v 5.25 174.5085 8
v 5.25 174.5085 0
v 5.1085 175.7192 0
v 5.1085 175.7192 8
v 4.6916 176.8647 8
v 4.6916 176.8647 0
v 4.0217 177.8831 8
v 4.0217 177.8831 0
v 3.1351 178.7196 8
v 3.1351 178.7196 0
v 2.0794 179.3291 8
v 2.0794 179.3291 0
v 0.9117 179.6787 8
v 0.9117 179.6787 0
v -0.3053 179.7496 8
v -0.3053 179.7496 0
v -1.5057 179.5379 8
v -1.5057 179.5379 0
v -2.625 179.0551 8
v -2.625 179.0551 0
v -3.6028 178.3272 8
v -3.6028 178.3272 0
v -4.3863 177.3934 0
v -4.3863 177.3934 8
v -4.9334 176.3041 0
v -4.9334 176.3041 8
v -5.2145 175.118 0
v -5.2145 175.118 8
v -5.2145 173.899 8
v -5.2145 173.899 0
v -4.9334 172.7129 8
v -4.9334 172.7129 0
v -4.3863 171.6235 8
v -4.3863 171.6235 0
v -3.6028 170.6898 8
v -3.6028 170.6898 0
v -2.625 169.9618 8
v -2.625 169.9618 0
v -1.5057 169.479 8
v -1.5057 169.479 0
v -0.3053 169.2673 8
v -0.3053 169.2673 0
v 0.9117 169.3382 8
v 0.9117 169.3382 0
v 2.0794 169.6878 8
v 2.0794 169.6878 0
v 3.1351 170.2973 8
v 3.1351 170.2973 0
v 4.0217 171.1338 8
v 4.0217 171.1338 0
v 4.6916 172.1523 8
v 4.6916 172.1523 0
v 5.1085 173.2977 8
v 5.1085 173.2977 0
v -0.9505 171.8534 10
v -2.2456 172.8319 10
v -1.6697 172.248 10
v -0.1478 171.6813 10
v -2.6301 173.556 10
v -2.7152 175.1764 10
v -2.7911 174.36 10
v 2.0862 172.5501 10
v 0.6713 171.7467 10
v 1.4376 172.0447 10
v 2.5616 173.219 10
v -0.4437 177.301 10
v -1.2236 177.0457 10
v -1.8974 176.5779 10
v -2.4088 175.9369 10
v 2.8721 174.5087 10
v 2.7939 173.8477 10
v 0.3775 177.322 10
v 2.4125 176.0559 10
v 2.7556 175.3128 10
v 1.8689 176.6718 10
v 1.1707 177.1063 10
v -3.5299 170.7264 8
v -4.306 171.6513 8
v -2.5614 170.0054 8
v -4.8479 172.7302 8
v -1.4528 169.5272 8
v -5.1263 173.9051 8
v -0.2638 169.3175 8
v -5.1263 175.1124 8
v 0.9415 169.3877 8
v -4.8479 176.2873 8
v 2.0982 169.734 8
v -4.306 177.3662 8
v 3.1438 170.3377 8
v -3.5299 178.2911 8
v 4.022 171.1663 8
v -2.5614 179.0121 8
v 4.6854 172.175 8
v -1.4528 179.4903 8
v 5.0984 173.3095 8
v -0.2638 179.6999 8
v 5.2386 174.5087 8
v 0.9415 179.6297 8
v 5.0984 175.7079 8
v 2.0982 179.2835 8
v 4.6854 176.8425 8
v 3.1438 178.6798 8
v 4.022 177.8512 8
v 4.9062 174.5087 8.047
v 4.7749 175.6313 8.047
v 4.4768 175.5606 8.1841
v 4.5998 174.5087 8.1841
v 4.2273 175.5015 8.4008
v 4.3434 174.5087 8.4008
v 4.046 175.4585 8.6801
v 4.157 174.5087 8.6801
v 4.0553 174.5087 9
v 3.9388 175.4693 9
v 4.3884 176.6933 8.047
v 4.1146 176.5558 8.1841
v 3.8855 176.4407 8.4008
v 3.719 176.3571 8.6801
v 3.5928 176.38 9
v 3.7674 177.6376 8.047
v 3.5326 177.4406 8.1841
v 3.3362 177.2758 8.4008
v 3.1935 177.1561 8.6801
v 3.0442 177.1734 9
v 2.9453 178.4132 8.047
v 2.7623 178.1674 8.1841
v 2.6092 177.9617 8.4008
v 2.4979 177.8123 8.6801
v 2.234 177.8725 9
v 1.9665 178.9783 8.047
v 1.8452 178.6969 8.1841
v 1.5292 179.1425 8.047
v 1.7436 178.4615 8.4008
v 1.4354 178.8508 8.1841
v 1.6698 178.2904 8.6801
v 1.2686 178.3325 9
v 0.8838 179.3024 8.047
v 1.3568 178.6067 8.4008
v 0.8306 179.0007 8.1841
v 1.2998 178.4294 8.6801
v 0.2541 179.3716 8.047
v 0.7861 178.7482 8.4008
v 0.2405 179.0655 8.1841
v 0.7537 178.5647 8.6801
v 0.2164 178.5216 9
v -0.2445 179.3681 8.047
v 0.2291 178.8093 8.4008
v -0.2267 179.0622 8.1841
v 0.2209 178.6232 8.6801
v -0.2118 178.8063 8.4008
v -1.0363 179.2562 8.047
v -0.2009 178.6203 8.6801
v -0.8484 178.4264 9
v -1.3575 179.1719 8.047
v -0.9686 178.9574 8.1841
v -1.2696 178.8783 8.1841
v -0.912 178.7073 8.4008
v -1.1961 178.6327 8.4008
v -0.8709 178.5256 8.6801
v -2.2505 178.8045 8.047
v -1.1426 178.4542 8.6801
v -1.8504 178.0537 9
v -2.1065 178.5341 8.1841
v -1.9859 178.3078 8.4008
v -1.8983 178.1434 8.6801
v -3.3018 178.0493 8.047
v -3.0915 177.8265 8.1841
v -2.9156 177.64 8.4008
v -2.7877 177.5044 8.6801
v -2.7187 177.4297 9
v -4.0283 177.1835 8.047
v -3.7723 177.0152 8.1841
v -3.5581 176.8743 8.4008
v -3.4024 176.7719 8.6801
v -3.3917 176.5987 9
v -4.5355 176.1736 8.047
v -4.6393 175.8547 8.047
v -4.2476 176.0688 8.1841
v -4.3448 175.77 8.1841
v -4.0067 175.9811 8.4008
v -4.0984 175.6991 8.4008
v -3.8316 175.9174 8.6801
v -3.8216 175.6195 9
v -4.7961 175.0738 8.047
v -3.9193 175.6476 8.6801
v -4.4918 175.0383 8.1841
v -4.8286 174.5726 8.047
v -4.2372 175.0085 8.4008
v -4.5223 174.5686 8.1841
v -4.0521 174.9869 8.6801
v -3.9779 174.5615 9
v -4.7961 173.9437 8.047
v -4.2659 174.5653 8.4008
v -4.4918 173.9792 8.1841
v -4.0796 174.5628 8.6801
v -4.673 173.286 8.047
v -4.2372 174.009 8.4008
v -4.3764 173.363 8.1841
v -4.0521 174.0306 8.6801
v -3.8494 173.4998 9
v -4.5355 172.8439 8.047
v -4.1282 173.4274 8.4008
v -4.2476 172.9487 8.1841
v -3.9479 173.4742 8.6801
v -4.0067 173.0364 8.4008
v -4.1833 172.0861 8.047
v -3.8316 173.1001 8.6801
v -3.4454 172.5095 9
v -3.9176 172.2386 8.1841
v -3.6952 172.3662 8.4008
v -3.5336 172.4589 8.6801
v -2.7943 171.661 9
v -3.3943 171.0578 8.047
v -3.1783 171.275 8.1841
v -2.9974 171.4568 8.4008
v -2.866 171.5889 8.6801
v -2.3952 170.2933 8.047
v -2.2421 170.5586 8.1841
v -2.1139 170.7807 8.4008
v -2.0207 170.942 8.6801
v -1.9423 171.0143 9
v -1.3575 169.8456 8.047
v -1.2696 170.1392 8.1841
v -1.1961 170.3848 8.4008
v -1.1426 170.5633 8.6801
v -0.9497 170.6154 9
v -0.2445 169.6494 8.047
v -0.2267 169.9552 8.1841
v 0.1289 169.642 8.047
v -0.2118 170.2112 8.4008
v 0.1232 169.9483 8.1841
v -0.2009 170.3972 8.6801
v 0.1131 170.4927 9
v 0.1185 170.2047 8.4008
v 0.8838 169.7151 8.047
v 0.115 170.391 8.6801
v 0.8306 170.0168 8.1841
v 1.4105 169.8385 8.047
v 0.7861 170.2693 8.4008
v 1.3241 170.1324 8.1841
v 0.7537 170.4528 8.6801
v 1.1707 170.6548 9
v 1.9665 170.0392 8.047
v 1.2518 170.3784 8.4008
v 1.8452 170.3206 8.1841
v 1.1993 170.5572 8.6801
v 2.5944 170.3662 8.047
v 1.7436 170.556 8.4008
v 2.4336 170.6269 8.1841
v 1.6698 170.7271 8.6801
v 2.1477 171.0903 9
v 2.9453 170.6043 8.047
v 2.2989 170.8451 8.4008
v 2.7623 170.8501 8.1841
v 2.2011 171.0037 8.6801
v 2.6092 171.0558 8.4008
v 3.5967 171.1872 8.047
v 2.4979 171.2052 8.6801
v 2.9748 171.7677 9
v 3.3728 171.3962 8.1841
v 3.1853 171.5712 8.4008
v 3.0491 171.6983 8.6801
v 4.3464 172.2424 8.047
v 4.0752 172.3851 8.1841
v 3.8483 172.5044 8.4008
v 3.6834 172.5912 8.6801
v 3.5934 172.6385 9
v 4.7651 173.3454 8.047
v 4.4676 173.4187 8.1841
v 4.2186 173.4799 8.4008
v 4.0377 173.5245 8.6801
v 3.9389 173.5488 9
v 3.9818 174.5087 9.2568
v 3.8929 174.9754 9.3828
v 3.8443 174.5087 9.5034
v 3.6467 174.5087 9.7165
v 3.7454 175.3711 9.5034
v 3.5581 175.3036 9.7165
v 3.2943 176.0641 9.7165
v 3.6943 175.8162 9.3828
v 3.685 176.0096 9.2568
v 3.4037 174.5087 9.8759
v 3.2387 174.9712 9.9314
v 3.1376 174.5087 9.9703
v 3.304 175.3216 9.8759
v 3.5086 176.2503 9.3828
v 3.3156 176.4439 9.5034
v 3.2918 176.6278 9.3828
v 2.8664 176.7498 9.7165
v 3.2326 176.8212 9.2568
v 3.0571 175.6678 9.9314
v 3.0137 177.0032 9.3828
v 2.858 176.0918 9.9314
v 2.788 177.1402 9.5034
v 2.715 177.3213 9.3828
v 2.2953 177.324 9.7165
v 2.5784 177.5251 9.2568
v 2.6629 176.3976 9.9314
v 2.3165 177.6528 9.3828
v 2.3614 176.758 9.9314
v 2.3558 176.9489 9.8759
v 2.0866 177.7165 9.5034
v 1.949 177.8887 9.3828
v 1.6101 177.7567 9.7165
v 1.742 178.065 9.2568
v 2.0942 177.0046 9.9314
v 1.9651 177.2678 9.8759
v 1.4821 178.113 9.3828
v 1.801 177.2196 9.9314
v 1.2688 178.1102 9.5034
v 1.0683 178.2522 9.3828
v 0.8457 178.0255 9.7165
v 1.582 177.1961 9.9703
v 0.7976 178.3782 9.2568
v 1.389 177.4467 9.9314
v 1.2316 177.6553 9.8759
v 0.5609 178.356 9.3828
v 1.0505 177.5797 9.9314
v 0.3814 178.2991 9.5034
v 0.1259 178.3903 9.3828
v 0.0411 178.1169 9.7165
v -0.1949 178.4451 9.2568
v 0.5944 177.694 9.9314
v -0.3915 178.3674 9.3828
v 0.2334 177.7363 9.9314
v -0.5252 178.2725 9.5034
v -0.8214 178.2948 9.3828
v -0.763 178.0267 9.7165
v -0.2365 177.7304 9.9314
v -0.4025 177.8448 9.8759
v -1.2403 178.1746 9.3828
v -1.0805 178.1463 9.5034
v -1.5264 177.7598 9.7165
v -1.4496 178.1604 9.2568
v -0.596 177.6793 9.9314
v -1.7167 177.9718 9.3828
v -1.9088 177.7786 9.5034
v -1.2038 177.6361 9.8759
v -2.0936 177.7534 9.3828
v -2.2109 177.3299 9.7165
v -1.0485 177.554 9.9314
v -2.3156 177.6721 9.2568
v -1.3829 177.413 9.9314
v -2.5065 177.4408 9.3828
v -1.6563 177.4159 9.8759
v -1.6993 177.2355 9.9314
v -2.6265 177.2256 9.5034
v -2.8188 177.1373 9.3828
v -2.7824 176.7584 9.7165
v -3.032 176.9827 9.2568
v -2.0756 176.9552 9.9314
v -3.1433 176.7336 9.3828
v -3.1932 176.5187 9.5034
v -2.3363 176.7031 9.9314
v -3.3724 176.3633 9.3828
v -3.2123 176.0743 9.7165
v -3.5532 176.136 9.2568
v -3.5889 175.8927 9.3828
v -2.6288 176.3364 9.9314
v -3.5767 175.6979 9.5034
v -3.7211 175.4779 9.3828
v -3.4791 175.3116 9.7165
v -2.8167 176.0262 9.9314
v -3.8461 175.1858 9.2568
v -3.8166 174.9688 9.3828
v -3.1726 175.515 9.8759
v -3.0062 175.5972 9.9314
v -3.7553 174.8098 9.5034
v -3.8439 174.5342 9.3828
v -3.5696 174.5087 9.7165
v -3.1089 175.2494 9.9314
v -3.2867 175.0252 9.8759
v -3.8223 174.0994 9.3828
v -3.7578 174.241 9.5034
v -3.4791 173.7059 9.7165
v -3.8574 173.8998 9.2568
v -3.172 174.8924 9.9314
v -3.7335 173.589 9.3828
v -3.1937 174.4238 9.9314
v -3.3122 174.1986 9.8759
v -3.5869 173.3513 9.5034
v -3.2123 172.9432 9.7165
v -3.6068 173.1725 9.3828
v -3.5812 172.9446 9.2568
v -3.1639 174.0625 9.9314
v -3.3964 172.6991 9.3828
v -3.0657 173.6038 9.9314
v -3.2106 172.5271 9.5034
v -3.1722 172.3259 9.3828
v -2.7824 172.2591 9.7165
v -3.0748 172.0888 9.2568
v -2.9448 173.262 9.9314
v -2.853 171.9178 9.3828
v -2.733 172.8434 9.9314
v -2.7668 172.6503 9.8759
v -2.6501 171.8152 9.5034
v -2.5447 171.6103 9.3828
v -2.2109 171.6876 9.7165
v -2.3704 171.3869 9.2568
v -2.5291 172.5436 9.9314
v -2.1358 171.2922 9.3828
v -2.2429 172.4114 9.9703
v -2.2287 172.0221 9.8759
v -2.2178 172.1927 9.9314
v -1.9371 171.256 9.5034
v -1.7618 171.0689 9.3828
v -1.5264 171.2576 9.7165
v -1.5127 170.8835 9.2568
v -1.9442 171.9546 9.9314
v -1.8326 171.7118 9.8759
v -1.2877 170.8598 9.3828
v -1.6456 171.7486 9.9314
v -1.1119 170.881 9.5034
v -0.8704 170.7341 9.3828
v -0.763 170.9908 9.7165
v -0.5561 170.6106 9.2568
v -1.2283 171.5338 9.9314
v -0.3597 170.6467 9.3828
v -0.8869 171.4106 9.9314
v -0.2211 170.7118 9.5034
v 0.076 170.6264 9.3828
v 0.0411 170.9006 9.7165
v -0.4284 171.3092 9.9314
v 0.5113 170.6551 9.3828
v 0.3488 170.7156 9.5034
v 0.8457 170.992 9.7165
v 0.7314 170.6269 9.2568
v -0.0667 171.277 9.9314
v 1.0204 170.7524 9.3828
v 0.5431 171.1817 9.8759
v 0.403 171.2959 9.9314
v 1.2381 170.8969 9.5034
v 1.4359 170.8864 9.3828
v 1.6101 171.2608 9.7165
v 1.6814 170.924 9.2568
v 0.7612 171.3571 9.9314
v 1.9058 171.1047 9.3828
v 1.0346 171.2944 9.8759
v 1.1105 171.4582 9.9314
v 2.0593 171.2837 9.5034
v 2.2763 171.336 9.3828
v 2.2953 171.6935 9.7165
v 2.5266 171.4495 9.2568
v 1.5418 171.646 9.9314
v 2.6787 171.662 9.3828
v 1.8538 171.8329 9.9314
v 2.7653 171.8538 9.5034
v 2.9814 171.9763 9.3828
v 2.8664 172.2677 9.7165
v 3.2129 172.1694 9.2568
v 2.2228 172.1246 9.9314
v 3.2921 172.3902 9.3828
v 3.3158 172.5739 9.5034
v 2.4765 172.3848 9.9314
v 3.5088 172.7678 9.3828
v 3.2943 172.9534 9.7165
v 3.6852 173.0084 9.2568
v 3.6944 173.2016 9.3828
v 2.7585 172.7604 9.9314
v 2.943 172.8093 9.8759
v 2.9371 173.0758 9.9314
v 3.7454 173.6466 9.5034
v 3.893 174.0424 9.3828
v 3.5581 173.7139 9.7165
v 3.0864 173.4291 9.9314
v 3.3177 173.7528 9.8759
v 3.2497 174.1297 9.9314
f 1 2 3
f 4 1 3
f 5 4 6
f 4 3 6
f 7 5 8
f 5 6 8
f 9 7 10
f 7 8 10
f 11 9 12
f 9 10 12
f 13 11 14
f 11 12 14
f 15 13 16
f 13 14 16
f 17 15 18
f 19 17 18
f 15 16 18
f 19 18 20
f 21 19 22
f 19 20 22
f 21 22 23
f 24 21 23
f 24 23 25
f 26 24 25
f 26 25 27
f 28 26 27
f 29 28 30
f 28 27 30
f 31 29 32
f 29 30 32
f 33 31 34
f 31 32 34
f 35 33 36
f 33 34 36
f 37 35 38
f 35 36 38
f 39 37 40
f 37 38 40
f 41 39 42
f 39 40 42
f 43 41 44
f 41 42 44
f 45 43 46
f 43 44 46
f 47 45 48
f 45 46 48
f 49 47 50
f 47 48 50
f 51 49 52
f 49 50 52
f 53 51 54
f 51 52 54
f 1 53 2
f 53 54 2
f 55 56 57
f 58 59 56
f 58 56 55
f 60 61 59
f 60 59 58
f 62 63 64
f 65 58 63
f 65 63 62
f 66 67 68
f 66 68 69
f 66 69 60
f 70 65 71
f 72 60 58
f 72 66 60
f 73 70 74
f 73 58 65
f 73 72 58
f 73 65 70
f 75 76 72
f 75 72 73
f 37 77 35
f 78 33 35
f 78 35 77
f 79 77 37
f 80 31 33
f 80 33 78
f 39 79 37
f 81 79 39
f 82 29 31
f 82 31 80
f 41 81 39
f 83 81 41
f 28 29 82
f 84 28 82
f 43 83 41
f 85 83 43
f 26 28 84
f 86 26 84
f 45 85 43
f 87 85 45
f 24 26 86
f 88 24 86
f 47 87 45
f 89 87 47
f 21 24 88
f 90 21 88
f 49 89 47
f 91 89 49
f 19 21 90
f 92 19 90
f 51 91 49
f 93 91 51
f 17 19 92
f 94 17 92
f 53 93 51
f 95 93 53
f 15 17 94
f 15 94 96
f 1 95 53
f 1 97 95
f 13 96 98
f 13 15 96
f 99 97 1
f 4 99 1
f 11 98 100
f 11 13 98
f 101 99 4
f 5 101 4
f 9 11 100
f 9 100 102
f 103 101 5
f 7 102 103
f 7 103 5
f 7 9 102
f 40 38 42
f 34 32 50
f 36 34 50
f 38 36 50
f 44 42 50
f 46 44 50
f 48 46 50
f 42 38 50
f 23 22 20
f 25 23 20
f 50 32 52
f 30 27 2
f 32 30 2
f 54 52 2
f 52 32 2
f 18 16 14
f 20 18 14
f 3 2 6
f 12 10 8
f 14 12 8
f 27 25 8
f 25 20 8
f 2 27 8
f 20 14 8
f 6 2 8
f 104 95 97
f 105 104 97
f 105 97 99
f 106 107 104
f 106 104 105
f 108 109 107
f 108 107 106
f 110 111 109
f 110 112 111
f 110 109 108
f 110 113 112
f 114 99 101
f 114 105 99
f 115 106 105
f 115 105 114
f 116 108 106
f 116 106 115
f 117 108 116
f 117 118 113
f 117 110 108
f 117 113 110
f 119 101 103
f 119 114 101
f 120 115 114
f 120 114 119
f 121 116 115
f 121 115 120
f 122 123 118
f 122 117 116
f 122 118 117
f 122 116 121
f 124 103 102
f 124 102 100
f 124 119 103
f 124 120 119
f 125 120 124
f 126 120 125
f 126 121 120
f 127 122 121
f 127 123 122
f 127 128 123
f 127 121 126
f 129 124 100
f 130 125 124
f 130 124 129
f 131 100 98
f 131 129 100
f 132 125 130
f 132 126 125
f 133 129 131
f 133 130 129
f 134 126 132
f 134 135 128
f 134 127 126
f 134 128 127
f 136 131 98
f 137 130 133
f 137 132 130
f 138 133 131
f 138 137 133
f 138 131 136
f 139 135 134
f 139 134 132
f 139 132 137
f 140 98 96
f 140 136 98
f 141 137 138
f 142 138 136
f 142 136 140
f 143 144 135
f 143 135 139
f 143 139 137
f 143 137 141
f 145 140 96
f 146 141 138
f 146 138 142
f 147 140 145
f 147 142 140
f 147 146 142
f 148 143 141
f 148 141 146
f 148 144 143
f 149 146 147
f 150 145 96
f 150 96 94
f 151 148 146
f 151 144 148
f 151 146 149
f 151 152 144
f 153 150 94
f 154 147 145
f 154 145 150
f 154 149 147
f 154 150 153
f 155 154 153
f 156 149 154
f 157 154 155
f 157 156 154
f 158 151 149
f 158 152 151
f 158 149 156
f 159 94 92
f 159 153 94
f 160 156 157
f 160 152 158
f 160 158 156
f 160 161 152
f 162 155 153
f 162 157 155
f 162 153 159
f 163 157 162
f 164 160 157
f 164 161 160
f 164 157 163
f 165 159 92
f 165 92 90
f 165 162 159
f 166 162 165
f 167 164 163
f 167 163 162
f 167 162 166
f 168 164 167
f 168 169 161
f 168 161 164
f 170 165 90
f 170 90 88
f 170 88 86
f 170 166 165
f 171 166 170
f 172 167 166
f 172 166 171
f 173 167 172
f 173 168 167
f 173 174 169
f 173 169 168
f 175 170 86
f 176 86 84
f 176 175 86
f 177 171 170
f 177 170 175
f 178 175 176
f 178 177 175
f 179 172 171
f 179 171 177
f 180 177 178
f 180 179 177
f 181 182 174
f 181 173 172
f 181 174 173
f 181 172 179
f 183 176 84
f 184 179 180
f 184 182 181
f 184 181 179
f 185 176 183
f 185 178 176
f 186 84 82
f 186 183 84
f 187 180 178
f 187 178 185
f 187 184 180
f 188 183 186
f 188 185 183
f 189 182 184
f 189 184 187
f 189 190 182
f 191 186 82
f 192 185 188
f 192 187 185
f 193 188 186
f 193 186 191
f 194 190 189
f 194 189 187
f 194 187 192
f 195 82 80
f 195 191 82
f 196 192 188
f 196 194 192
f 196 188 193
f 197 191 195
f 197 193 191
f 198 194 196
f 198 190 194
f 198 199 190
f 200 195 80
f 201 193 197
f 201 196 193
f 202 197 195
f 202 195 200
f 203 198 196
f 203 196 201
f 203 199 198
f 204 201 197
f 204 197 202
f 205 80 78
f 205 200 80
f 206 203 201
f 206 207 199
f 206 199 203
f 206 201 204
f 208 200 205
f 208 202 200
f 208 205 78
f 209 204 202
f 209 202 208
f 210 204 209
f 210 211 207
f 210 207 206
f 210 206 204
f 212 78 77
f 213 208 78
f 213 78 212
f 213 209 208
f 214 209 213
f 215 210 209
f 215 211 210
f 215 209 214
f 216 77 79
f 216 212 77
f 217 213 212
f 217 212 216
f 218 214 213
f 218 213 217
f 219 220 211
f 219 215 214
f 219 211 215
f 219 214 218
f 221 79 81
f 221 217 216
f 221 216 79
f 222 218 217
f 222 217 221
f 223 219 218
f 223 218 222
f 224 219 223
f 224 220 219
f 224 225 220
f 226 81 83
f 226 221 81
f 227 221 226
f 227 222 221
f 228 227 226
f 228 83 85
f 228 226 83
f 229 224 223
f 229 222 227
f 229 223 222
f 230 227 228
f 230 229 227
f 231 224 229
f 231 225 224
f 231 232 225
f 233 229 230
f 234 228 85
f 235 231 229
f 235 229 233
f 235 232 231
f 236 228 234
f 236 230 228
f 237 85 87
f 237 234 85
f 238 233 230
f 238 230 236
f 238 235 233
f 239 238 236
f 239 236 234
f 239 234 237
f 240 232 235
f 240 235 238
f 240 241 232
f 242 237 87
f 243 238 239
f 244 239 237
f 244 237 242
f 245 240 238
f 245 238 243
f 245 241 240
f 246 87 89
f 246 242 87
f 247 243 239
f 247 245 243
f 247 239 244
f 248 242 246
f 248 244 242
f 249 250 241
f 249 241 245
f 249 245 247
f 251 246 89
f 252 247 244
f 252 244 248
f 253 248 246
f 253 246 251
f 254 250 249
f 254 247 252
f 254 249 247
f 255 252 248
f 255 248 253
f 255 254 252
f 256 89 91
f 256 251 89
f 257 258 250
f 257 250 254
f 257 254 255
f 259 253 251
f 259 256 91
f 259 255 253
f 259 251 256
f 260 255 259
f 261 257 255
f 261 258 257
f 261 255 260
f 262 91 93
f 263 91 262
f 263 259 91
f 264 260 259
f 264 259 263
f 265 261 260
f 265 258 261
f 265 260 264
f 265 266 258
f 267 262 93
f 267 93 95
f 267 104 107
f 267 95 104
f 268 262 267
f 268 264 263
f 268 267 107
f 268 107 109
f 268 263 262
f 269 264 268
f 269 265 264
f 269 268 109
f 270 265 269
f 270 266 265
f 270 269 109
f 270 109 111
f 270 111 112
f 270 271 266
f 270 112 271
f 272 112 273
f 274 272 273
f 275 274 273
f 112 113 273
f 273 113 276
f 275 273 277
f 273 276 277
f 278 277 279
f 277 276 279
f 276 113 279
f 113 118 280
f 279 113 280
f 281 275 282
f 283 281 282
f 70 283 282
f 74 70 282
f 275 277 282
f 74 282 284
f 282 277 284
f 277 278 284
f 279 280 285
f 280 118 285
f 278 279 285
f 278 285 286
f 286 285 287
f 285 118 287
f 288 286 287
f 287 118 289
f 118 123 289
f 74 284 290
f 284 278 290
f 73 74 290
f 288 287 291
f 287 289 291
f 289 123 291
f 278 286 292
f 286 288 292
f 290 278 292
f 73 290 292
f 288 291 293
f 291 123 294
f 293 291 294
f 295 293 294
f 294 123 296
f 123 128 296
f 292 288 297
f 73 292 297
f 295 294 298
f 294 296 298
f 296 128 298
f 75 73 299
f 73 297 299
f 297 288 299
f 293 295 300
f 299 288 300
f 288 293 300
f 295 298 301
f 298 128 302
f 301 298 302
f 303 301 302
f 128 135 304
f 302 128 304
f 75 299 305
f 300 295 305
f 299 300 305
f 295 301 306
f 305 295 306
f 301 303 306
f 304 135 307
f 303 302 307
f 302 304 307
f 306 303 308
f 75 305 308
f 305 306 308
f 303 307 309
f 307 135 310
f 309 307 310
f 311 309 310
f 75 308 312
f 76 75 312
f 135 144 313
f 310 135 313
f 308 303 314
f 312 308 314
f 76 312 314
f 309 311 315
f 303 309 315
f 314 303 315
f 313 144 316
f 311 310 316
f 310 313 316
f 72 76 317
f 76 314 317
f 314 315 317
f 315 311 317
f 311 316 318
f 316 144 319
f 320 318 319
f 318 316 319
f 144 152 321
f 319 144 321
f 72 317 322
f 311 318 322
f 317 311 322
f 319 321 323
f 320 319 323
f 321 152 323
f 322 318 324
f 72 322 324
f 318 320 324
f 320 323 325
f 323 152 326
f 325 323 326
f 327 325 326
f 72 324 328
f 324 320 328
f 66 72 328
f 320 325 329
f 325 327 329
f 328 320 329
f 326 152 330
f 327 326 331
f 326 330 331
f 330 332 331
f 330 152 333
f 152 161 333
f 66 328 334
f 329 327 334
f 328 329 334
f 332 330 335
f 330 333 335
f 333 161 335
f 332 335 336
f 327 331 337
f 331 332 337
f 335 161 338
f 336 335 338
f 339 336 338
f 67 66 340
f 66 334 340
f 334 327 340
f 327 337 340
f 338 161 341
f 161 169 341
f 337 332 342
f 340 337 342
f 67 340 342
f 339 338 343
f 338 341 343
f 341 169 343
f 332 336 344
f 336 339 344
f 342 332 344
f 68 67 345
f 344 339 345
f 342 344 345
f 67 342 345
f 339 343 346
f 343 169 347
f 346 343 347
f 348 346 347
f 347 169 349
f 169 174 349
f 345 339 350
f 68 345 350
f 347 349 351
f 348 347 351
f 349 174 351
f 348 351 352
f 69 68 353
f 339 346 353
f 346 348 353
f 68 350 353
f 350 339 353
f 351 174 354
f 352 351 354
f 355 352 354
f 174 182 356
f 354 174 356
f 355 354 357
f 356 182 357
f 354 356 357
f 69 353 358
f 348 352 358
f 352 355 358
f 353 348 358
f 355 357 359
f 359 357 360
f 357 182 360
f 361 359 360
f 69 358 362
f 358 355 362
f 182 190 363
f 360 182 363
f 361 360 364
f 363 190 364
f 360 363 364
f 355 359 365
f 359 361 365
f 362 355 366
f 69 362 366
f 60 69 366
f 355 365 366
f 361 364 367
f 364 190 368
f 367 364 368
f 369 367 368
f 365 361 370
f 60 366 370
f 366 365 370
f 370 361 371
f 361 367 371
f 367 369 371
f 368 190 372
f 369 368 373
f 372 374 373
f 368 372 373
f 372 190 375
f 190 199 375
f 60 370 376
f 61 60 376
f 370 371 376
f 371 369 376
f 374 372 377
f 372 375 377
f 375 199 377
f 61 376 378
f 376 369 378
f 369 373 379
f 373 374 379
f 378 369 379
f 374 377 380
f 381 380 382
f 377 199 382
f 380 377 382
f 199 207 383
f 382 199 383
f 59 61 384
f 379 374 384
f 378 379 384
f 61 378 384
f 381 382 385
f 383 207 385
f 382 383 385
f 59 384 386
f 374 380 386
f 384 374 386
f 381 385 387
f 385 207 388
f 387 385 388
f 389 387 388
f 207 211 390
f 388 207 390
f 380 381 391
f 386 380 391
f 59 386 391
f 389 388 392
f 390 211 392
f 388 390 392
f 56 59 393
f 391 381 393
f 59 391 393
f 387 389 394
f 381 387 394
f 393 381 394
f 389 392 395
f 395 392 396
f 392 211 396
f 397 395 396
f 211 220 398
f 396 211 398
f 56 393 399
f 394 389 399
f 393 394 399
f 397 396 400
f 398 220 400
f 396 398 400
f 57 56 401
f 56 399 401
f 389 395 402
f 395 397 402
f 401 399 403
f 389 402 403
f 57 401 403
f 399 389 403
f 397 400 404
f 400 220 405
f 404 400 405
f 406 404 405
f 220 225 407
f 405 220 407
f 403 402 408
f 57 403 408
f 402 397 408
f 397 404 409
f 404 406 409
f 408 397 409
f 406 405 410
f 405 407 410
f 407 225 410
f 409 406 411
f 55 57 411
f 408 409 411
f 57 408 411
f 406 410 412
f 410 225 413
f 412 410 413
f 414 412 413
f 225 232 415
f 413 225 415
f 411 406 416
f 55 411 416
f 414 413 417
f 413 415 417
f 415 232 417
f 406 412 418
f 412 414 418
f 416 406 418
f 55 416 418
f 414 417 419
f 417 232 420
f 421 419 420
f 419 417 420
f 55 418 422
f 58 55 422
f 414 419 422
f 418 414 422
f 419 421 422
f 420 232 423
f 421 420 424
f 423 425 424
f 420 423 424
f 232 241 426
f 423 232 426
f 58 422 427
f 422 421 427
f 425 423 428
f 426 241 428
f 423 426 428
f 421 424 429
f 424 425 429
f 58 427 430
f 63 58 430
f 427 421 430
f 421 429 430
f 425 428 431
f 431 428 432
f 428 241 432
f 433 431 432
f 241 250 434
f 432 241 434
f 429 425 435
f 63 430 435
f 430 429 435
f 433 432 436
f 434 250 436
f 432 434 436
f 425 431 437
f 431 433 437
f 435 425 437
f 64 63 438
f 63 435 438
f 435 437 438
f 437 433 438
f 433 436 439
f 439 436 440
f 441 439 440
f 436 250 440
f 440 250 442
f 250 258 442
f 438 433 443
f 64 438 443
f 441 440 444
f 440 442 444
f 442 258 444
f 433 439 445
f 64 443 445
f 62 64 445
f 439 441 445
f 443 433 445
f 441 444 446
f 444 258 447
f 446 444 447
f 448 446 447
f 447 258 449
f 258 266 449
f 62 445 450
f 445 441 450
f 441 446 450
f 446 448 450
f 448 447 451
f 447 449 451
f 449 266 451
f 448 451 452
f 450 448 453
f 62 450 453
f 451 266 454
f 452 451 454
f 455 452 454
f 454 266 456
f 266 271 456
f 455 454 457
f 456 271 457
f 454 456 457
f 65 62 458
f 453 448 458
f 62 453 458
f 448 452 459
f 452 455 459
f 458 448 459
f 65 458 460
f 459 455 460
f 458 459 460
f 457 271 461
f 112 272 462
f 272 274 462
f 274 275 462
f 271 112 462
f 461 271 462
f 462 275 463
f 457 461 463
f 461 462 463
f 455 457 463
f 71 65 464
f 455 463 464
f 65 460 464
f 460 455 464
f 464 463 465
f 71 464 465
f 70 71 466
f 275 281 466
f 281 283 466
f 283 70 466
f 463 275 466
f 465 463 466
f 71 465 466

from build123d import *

# Parameters (mm, degrees)
SKETCH1_R           = 5.25
BOSS_EXTRUDE1_DEPTH = 8
SKETCH2_R           = 4
BOSS_EXTRUDE2_DEPTH = 2
FILLET2_R           = 1.2
FILLET3_R           = 1.2


with BuildPart() as part:
    # Sketch1 → Boss-Extrude1 (new body)
    with BuildSketch(Plane.XY):
        with Locations((0, 174.50846383)):
            Circle(SKETCH1_R)
    extrude(amount=BOSS_EXTRUDE1_DEPTH)

    # Sketch2 → Boss-Extrude2 (add)
    with BuildSketch(Plane.XY.offset(8)):
        with Locations((0.038551533, 174.508746935)):
            Circle(SKETCH2_R)
    extrude(amount=BOSS_EXTRUDE2_DEPTH)

    # Fillet2
    fillet2_edges = [part.edges().sort_by_distance(p)[0] for p in [
        (-3.961448467, 174.508746935, 8),
    ]]
    fillet(fillet2_edges, radius=FILLET2_R)

    # Fillet3
    fillet3_edges = [part.edges().sort_by_distance(p)[0] for p in [
        (-3.961448467, 174.508746935, 10),
    ]]
    fillet(fillet3_edges, radius=FILLET3_R)


solid = part.part
